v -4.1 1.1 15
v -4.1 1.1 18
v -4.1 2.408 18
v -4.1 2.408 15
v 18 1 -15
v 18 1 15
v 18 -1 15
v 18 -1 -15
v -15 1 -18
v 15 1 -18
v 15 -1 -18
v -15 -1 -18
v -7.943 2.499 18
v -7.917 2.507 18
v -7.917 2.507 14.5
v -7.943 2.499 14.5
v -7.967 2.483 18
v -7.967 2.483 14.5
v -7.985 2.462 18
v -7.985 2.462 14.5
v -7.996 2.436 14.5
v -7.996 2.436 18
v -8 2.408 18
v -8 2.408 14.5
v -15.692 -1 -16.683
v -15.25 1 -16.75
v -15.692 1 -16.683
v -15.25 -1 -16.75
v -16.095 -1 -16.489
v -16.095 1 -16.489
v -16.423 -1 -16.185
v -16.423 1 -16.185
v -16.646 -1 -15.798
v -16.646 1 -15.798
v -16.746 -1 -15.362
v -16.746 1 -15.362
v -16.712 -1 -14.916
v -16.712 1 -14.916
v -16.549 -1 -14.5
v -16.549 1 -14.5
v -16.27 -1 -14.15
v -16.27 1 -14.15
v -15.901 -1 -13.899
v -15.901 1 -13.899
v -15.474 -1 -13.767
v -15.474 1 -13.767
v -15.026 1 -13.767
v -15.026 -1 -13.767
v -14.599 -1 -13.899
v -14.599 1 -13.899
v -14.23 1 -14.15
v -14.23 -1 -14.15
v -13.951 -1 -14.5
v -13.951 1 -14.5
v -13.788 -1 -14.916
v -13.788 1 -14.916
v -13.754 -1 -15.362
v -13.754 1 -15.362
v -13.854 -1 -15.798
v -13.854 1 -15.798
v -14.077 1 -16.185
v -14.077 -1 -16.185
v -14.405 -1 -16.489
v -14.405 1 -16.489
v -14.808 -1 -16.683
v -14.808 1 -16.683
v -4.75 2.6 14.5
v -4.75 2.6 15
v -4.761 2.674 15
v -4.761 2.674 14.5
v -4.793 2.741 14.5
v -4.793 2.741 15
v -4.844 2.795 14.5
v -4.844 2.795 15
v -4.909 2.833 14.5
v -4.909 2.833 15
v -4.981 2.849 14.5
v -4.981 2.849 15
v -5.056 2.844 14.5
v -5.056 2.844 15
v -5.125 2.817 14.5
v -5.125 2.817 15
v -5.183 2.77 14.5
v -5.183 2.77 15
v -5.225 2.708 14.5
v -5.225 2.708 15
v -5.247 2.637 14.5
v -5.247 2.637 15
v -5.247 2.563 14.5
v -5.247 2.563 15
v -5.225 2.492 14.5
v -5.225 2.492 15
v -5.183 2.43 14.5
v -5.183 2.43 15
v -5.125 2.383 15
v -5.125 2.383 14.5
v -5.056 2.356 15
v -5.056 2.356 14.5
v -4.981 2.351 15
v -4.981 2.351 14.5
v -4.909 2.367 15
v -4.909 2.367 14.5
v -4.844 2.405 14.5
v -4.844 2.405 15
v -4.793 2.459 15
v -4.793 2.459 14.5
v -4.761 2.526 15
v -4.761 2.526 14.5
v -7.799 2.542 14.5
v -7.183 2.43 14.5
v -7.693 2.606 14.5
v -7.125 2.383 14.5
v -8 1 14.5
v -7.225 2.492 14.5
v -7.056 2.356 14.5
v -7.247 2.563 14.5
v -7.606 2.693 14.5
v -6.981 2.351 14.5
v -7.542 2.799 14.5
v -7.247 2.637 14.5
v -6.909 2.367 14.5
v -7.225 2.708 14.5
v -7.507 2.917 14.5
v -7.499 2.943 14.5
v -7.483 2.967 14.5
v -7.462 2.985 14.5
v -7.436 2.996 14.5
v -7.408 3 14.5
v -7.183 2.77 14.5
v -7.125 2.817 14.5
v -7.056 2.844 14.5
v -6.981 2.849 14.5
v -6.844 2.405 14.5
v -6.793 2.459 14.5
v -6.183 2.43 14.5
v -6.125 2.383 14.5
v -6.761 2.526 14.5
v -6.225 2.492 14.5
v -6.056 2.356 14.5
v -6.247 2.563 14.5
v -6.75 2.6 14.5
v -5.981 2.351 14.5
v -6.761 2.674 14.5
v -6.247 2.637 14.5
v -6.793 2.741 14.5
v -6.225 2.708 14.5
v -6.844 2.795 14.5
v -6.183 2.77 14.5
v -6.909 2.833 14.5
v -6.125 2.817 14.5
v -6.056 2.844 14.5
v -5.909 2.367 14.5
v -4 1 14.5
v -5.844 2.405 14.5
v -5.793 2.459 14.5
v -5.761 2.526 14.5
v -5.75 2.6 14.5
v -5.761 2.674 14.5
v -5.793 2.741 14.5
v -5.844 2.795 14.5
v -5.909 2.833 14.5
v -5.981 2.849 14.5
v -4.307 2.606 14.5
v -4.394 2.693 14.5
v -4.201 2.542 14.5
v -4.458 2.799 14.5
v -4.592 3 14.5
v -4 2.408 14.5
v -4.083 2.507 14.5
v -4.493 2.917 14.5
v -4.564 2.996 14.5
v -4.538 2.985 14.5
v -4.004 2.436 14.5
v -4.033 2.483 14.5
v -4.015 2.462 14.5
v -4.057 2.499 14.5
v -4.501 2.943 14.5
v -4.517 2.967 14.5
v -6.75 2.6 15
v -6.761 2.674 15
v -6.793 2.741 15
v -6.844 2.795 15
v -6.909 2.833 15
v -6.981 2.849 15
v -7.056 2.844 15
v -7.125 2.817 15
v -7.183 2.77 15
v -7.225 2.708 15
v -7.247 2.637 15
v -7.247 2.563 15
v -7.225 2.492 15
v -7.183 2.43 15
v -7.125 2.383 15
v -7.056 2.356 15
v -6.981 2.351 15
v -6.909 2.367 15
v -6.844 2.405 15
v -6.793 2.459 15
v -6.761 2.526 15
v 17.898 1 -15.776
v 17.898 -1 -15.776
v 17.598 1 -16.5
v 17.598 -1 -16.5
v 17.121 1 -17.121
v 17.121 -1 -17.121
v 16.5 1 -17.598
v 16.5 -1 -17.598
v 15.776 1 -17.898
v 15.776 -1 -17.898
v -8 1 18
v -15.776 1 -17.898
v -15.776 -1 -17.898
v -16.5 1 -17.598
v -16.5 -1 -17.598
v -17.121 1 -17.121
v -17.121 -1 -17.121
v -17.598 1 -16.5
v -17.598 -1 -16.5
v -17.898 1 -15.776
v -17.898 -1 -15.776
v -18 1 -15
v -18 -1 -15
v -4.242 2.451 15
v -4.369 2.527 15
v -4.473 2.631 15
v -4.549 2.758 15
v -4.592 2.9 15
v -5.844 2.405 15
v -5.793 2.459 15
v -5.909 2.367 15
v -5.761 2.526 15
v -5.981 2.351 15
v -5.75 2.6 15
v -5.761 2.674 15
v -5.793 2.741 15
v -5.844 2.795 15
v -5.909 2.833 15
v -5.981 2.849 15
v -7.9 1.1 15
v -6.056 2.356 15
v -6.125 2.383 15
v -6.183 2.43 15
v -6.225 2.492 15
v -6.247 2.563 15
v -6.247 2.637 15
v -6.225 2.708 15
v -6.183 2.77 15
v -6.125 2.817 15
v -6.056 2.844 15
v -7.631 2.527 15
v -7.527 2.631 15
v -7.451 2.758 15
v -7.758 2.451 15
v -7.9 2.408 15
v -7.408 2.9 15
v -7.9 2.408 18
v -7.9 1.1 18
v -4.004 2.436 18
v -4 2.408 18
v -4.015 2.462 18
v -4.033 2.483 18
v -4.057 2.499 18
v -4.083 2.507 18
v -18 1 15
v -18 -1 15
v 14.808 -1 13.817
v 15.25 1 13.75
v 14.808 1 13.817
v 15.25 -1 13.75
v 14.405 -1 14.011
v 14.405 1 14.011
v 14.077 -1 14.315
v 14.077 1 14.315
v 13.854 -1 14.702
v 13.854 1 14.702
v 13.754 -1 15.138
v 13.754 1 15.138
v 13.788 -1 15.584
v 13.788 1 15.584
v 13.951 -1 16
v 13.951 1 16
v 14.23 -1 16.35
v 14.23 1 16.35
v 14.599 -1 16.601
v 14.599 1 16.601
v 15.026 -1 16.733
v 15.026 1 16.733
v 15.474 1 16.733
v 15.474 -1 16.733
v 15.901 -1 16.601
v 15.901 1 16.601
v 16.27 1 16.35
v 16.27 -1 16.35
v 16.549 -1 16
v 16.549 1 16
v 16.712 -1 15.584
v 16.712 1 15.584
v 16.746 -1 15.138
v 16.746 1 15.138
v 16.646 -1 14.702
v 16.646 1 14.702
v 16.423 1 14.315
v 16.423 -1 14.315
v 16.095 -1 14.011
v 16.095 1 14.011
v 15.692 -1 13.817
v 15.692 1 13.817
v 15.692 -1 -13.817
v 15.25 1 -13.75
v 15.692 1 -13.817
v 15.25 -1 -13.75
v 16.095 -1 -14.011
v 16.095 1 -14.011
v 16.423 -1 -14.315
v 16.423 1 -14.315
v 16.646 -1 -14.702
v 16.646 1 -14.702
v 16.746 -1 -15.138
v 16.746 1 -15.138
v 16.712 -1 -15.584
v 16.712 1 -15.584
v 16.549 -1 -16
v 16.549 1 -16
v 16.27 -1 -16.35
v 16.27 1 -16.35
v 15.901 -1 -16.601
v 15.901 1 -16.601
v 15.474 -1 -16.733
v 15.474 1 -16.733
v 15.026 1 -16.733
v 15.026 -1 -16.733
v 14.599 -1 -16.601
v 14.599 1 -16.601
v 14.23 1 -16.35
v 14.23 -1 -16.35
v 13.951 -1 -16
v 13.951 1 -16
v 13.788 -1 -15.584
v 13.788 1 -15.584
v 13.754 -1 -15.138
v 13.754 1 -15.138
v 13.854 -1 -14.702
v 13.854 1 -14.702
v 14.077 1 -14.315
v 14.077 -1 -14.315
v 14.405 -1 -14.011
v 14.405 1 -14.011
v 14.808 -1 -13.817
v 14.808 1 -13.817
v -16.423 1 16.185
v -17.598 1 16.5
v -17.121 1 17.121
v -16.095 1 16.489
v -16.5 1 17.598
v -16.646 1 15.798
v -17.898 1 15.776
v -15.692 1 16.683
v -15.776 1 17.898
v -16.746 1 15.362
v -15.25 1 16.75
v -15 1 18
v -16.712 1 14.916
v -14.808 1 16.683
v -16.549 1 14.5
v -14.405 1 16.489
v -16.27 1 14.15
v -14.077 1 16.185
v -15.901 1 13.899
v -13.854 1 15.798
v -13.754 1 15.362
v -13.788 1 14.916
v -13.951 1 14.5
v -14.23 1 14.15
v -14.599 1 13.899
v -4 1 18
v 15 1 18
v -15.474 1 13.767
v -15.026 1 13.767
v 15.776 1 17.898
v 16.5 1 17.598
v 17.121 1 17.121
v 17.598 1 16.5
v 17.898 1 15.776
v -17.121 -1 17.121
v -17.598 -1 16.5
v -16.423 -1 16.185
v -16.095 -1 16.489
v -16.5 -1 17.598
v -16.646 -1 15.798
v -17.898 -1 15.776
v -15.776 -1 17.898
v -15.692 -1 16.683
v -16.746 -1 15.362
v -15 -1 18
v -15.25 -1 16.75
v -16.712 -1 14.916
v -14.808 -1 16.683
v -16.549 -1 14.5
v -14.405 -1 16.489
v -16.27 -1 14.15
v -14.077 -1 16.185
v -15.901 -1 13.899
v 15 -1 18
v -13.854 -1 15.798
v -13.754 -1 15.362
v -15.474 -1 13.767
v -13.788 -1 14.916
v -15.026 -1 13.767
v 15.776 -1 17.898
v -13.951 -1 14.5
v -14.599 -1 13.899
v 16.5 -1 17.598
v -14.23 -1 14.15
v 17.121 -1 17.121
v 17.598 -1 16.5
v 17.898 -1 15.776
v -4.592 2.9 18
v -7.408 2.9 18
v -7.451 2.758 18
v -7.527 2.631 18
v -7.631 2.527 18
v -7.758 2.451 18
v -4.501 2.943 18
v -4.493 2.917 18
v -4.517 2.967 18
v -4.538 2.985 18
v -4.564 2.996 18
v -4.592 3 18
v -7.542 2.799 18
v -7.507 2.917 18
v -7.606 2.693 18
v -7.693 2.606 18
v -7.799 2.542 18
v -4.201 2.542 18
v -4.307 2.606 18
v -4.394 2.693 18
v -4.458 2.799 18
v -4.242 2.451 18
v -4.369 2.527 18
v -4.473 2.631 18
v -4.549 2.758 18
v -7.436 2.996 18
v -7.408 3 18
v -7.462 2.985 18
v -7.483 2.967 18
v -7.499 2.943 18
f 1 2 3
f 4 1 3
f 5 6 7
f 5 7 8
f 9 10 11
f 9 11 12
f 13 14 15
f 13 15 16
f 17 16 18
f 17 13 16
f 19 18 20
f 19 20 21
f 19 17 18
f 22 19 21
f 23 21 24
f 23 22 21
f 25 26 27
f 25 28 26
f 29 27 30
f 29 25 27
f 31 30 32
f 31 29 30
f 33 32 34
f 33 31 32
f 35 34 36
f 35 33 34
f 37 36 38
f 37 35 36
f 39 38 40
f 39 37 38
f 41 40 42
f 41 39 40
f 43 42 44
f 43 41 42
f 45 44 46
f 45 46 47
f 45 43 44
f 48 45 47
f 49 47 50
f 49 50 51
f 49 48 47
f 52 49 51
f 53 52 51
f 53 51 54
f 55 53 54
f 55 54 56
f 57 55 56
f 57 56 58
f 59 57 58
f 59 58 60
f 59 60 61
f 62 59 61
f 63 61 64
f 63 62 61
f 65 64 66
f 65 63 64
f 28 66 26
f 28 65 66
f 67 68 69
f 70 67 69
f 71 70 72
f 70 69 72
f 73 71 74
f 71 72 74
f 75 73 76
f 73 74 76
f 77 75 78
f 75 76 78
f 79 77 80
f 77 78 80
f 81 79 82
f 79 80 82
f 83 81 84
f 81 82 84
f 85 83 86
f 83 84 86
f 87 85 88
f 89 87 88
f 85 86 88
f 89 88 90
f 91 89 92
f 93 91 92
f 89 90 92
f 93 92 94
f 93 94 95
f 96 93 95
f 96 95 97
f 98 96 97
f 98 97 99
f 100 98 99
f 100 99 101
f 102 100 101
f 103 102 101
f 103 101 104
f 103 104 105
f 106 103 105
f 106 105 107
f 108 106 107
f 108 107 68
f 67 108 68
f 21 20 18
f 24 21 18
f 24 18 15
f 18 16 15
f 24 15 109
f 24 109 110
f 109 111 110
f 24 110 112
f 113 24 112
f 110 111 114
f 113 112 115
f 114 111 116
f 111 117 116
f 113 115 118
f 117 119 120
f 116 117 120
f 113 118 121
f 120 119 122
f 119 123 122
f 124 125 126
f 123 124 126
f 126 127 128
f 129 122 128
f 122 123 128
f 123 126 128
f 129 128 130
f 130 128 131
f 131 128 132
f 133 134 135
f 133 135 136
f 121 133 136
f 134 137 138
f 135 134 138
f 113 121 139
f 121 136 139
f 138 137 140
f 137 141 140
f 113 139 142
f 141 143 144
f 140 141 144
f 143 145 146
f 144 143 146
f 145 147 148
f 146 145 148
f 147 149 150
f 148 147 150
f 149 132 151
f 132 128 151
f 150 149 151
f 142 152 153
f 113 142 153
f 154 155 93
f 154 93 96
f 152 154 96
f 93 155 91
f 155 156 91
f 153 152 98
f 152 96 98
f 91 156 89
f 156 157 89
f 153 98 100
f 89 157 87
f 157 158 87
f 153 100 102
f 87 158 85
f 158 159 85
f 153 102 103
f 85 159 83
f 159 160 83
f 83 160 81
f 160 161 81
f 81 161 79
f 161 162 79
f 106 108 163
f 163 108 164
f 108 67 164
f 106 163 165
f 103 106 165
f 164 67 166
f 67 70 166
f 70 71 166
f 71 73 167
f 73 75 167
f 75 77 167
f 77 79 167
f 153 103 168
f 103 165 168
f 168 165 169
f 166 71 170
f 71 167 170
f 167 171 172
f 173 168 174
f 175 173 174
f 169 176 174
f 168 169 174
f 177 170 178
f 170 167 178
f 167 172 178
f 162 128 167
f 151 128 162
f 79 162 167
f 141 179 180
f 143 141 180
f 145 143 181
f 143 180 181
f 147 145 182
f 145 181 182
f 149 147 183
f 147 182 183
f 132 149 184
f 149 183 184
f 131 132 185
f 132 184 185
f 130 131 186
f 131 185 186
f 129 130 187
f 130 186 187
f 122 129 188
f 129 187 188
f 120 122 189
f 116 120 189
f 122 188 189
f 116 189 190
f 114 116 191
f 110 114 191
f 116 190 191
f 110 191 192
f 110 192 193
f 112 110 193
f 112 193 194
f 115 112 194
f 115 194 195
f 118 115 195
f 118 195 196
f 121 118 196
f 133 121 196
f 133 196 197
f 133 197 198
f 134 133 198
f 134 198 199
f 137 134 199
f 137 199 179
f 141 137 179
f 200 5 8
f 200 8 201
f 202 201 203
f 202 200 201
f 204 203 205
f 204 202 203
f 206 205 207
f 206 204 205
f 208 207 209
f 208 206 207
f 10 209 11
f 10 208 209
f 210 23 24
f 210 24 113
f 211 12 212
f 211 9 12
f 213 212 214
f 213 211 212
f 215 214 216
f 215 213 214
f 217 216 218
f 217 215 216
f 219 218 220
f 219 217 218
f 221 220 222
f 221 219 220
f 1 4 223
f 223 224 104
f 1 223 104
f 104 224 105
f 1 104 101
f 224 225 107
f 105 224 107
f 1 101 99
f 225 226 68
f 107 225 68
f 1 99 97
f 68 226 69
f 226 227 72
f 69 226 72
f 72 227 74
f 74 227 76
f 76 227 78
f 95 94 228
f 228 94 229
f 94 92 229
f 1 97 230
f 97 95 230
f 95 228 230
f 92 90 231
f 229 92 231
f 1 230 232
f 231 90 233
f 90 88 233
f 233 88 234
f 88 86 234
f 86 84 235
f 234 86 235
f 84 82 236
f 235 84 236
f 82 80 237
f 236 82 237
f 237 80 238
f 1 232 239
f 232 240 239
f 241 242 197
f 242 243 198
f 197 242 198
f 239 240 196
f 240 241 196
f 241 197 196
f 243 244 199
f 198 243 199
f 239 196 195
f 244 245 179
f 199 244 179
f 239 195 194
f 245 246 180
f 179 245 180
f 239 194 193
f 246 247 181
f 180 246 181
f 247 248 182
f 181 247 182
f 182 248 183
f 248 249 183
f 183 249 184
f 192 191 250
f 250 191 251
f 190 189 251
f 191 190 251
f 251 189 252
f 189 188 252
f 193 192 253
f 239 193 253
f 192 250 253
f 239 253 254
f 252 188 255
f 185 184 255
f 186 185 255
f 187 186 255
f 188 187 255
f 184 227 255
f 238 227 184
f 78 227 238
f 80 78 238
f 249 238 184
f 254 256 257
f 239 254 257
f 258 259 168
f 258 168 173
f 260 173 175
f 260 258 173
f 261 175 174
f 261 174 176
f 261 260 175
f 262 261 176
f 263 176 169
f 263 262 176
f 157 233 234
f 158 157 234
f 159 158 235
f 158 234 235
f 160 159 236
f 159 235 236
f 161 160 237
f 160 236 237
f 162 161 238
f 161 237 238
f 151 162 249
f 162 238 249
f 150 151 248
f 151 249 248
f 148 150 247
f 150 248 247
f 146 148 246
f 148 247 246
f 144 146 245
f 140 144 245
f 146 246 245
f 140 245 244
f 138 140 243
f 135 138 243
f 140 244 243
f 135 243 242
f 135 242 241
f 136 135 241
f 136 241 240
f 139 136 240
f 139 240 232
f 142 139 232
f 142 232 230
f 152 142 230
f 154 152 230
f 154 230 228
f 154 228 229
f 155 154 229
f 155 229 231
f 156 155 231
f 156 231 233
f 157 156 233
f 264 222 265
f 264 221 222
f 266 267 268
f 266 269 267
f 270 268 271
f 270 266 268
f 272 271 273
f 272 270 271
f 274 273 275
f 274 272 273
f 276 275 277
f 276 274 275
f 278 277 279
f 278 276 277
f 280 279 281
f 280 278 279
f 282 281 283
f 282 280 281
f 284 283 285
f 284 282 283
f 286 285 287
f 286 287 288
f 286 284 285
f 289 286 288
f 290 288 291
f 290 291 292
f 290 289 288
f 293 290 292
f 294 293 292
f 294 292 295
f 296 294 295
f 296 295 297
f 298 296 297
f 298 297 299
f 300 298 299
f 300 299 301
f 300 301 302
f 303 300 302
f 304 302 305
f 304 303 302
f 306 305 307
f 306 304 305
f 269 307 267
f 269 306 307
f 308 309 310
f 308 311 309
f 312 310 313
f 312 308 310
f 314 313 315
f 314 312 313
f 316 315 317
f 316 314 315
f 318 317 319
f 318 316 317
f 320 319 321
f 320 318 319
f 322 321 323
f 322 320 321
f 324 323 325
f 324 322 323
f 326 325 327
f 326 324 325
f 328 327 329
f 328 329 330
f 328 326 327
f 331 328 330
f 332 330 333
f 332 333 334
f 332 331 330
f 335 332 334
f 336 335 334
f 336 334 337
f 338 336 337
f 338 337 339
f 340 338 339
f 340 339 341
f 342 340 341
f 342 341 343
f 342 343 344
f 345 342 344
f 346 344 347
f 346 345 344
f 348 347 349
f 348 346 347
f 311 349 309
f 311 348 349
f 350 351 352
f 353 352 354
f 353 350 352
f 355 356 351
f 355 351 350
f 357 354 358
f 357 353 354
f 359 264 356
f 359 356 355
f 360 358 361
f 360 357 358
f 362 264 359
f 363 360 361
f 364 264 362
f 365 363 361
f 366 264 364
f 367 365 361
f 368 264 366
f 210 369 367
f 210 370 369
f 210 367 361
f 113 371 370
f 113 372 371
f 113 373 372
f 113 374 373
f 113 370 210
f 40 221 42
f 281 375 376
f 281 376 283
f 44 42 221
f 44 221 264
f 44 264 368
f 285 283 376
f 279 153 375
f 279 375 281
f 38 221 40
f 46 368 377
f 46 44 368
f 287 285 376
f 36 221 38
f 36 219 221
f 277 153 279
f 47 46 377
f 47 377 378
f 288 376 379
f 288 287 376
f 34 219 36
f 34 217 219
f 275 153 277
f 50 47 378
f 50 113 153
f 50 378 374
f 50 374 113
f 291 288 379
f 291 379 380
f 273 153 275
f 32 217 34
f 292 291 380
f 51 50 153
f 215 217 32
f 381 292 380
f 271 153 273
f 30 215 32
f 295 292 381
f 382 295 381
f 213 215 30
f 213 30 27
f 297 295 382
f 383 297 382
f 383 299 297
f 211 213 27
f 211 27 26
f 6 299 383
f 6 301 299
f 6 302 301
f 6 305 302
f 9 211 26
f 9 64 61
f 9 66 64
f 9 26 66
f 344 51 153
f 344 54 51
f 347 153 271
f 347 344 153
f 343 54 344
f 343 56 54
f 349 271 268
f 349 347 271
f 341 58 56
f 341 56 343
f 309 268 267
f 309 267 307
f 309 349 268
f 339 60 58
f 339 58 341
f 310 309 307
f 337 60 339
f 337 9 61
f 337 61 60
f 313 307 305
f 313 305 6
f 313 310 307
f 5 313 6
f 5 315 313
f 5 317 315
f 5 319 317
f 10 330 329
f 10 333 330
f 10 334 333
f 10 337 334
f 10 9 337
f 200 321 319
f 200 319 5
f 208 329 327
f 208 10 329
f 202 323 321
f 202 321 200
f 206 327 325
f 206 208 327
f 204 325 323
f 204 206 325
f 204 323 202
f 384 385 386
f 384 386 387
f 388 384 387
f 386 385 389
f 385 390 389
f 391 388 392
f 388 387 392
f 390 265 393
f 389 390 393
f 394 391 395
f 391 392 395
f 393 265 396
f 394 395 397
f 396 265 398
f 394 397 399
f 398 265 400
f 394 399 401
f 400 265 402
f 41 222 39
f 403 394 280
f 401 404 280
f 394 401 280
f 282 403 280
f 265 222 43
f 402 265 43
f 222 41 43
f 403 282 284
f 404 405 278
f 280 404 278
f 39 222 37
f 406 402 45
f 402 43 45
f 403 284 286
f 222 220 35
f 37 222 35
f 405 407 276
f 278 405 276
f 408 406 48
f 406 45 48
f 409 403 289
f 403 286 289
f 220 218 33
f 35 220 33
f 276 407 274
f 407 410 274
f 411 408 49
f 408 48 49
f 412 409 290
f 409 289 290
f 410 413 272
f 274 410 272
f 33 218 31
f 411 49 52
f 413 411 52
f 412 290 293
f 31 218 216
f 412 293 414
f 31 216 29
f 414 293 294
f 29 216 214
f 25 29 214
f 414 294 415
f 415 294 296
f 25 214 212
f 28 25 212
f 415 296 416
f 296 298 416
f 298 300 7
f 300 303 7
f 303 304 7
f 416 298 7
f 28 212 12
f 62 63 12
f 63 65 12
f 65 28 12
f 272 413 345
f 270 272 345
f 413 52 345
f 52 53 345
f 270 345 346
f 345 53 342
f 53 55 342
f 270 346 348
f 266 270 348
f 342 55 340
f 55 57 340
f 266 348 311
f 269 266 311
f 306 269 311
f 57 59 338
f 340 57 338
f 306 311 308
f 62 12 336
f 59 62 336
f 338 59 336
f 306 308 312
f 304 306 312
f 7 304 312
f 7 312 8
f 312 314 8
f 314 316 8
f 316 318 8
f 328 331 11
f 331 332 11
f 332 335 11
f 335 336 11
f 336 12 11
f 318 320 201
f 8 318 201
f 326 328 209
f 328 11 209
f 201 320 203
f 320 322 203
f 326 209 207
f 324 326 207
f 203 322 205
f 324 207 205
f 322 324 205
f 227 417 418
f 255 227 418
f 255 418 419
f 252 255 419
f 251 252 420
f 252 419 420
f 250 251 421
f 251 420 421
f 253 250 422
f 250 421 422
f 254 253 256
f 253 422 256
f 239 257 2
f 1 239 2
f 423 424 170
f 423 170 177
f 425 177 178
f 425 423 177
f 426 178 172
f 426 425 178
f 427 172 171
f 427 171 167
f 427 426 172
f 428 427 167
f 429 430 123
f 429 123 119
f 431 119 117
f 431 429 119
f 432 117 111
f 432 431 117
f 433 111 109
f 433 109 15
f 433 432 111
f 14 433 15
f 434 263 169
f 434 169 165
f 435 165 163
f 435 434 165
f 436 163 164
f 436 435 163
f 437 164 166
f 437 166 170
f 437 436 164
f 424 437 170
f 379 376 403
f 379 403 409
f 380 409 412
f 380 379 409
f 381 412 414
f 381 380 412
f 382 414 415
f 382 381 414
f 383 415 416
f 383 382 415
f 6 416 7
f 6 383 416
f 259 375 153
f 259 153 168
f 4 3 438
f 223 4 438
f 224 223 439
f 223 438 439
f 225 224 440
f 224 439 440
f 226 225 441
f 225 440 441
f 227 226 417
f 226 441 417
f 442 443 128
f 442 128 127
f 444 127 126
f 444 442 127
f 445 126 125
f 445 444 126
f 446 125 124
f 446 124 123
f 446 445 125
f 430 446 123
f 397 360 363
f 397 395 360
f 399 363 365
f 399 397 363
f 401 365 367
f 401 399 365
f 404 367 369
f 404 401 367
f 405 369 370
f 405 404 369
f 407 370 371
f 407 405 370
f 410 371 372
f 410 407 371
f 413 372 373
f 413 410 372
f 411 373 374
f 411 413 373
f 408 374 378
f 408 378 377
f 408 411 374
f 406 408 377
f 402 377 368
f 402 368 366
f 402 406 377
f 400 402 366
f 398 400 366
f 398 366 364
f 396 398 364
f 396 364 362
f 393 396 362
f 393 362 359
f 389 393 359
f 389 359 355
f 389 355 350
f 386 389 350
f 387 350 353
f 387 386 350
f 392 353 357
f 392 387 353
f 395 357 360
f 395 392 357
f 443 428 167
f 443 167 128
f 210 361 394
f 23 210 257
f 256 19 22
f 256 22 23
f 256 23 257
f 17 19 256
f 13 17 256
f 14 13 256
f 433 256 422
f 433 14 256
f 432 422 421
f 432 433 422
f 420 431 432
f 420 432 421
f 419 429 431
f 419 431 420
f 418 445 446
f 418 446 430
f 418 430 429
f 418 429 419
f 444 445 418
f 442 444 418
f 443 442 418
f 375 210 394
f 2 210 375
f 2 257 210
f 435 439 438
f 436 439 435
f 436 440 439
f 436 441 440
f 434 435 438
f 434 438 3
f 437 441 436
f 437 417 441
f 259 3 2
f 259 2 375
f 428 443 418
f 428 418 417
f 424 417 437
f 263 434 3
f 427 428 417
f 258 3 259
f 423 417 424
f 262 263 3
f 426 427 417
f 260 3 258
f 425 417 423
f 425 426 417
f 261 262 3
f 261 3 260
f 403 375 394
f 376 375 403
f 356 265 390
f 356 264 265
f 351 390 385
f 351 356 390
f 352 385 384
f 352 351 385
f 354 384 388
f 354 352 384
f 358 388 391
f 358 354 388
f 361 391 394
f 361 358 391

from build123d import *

# Parameters (mm, degrees)
SKETCH1_R           = 1.5
BOSS_EXTRUDE1_DEPTH = 1
BOSS_EXTRUDE2_DEPTH = 3.5
BOSS_EXTRUDE3_DEPTH = 0.5
SKETCH4_R           = 0.25
CUT_EXTRUDE1_DEPTH  = 38.70941527


with BuildPart() as part:
    # Sketch1 → Boss-Extrude1 (new, symmetric)
    with BuildSketch(Plane(origin=(0, 0, 0), x_dir=(1, 0, 0), z_dir=(0, 1, 0))):
        with BuildLine():
            Line((-15, -18), (15, -18))
            ThreePointArc((15, -18), (17.121320344, -17.121320344), (18, -15))
            Line((18, -15), (18, 15))
            ThreePointArc((18, 15), (17.121320344, 17.121320344), (15, 18))
            Line((15, 18), (-15, 18))
            ThreePointArc((-15, 18), (-17.121320344, 17.121320344), (-18, 15))
            Line((-18, 15), (-18, -15))
            ThreePointArc((-18, -15), (-17.121320344, -17.121320344), (-15, -18))
        make_face()
        with Locations(Location((15.25, 15.25, 0), (0, 0, 270))):
            Circle(SKETCH1_R, mode=Mode.SUBTRACT)
        with Locations(Location((-15.25, 15.25, 0), (0, 0, 90))):
            Circle(SKETCH1_R, mode=Mode.SUBTRACT)
        with Locations(Location((15.25, -15.25, 0), (0, 0, 90))):
            Circle(SKETCH1_R, mode=Mode.SUBTRACT)
        with Locations(Location((-15.25, -15.25, 0), (0, 0, 270))):
            Circle(SKETCH1_R, mode=Mode.SUBTRACT)
    extrude(amount=BOSS_EXTRUDE1_DEPTH, both=True)

    # Sketch2 → Boss-Extrude2 (add)
    with BuildSketch(Plane.XY.offset(18)):
        with BuildLine():
            Line((-8, 1), (-4, 1))
            Line((-4, 1), (-4, 2.408392022))
            ThreePointArc((-4, 2.408392022), (-4.023623738, 2.472941744), (-4.083333333, 2.506993351))
            ThreePointArc((-4.083333333, 2.506993351), (-4.353553391, 2.646446609), (-4.493006649, 2.916666667))
            ThreePointArc((-4.493006649, 2.916666667), (-4.527058256, 2.976376262), (-4.591607978, 3))
            Line((-4.591607978, 3), (-7.408392022, 3))
            ThreePointArc((-7.408392022, 3), (-7.472941744, 2.976376262), (-7.506993351, 2.916666667))
            ThreePointArc((-7.506993351, 2.916666667), (-7.646446609, 2.646446609), (-7.916666667, 2.506993351))
            ThreePointArc((-7.916666667, 2.506993351), (-7.976376262, 2.472941744), (-8, 2.408392022))
            Line((-8, 2.408392022), (-8, 1))
        make_face()
        with BuildLine():
            Line((-4.1, 1.1), (-4.1, 2.408392022))
            ThreePointArc((-4.1, 2.408392022), (-4.424264069, 2.575735931), (-4.591607978, 2.9))
            Line((-4.591607978, 2.9), (-7.408392022, 2.9))
            ThreePointArc((-7.408392022, 2.9), (-7.575735931, 2.575735931), (-7.9, 2.408392022))
            Line((-7.9, 2.408392022), (-7.9, 1.1))
            Line((-7.9, 1.1), (-4.1, 1.1))
        make_face(mode=Mode.SUBTRACT)
    extrude(amount=-BOSS_EXTRUDE2_DEPTH)

    # Sketch3 → Boss-Extrude3 (add)
    with BuildSketch(Plane(origin=(0, 0, 14.5), x_dir=(-1, 0, 0), z_dir=(0, 0, -1))):
        with BuildLine():
            Line((8, 1), (8, 2.408392022))
            ThreePointArc((8, 2.408392022), (7.976376262, 2.472941744), (7.916666667, 2.506993351))
            ThreePointArc((7.916666667, 2.506993351), (7.646446609, 2.646446609), (7.506993351, 2.916666667))
            ThreePointArc((7.506993351, 2.916666667), (7.472941744, 2.976376262), (7.408392022, 3))
            Line((7.408392022, 3), (4.591607978, 3))
            ThreePointArc((4.591607978, 3), (4.527058256, 2.976376262), (4.493006649, 2.916666667))
            ThreePointArc((4.493006649, 2.916666667), (4.353553391, 2.646446609), (4.083333333, 2.506993351))
            ThreePointArc((4.083333333, 2.506993351), (4.023623738, 2.472941744), (4, 2.408392022))
            Line((4, 2.408392022), (4, 1))
            Line((4, 1), (8, 1))
        make_face()
    extrude(amount=-BOSS_EXTRUDE3_DEPTH)

    # Sketch4 → Cut-Extrude1 (cut, through all)
    with BuildSketch(Plane.XY.offset(15)):
        with Locations((-7, 2.6)):
            Circle(SKETCH4_R)
        with Locations((-6, 2.6)):
            Circle(SKETCH4_R)
        with Locations((-5, 2.6)):
            Circle(SKETCH4_R)
    extrude(amount=-CUT_EXTRUDE1_DEPTH, mode=Mode.SUBTRACT)


solid = part.part
